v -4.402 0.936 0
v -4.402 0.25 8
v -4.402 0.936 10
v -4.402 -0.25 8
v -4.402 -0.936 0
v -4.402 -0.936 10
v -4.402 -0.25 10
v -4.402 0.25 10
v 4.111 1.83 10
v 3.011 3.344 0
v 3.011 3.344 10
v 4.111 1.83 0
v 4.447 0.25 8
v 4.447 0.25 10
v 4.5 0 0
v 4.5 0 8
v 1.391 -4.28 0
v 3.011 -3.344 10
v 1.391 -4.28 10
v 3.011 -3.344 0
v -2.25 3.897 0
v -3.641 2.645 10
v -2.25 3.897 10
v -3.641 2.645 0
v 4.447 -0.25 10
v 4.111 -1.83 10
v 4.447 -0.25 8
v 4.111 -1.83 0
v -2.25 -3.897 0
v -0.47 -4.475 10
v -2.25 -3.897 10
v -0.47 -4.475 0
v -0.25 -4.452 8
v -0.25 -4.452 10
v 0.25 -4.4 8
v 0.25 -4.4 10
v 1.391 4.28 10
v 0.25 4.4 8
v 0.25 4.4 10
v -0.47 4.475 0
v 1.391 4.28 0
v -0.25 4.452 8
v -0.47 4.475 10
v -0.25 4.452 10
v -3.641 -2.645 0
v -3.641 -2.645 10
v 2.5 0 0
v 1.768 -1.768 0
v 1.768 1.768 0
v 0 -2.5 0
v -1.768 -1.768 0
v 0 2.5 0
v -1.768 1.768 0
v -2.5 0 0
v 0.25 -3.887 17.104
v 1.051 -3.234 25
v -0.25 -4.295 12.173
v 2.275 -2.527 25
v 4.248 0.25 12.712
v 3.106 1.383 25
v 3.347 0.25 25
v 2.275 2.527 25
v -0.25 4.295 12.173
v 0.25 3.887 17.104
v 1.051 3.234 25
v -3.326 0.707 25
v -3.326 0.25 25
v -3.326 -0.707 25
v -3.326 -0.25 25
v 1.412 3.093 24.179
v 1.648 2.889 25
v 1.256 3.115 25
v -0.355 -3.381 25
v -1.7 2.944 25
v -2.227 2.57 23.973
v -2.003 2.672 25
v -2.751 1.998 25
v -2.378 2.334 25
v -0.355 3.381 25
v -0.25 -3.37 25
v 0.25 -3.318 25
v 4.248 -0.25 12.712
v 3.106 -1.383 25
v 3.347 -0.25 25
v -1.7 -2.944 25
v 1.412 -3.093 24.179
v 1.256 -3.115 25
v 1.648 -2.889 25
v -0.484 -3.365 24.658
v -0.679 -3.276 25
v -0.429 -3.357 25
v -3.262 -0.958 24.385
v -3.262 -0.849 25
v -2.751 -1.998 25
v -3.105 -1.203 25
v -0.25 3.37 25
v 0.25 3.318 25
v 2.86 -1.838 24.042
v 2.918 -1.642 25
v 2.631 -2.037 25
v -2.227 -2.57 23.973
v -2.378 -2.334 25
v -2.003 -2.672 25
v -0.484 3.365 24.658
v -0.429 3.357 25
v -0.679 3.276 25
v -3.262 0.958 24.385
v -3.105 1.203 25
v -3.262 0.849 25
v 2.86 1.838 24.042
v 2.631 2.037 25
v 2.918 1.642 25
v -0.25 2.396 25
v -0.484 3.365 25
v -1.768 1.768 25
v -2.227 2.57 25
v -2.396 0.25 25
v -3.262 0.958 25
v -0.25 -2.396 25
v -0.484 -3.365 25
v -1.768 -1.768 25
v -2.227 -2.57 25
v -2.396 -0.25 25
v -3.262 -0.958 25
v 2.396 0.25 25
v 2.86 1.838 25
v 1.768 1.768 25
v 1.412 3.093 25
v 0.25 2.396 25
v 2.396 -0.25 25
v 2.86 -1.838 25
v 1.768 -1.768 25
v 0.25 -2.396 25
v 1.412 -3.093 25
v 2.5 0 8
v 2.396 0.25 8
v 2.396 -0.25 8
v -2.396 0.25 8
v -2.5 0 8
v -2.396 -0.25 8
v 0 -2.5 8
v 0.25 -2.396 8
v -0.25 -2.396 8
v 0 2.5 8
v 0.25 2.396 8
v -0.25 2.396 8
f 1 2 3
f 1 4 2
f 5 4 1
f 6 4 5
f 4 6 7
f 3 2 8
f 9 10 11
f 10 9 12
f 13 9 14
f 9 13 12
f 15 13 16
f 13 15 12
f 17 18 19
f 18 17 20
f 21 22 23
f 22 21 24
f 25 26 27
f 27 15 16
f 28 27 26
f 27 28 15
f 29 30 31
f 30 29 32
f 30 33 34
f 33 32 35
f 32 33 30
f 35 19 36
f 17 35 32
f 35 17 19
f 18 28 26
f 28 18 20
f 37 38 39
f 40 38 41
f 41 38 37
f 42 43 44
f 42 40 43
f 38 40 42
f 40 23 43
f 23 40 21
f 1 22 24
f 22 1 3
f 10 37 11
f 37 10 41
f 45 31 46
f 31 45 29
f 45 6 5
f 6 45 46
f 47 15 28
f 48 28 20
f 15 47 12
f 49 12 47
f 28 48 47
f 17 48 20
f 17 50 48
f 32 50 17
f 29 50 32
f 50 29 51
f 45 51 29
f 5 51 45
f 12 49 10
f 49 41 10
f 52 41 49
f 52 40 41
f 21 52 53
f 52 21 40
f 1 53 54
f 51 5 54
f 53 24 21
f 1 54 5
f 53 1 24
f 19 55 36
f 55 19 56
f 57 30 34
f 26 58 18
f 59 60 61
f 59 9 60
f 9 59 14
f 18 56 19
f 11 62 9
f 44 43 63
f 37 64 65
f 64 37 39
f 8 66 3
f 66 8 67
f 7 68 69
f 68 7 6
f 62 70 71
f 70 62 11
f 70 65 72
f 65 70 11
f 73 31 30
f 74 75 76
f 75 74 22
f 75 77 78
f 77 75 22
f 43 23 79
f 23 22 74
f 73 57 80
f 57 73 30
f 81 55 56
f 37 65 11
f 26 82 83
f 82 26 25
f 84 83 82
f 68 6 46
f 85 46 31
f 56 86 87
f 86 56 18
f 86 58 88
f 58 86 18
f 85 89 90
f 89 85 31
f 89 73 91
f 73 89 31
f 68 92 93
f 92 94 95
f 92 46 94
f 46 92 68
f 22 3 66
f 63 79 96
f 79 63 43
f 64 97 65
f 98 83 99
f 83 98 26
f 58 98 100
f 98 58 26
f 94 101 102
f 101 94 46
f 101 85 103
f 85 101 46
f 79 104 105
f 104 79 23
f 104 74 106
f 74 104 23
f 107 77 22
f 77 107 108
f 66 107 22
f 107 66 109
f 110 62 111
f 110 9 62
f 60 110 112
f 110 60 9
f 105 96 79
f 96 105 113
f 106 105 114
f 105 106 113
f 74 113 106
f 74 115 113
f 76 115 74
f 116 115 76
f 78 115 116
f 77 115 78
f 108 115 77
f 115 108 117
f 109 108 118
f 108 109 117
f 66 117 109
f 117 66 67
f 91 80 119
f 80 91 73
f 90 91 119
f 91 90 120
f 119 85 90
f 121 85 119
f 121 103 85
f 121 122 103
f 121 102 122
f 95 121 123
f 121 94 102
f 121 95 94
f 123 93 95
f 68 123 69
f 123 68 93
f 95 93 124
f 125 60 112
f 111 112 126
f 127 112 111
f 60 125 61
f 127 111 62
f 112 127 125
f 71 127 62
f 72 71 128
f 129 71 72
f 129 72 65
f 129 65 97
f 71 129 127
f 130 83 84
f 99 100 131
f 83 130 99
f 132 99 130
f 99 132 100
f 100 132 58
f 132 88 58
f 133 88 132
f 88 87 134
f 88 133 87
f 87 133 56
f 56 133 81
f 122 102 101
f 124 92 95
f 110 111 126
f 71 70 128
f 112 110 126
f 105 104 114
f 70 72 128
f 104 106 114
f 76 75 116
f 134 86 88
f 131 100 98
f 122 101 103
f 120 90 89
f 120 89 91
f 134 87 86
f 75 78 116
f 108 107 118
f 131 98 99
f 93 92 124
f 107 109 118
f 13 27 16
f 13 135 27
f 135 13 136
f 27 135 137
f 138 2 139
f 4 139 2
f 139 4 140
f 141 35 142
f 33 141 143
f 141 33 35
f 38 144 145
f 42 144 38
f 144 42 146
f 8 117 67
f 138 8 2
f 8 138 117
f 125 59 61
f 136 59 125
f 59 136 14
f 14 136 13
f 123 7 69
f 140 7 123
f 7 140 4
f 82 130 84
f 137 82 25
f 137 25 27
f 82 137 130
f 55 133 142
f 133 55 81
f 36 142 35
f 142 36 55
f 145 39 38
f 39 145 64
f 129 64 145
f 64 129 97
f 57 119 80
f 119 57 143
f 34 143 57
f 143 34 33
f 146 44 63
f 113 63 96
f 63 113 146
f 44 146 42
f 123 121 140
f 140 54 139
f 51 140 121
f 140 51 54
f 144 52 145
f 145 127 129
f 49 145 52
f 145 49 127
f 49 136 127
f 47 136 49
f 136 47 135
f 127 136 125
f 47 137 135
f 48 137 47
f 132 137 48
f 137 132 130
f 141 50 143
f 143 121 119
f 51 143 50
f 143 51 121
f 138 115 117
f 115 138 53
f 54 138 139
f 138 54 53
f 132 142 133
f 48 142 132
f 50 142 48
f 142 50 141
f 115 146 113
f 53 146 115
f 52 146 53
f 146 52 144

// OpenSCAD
// Drill depth gauge collet
// default sizes are for a M8 nut
module collet(
	drilldia=5,
	min=6.8,
	max=9,
	slot=0.5) {


	difference() {
		union() {
			cylinder(r=max/2, h=10);
			translate([0,0,10])
				cylinder(r1=max/2, r2=min/2, h=15);
			translate([0,0,20])
				cylinder(r=min/2,h=5);
		}

		translate([-10,-slot/2,8])
			cube([20,slot,20]);

		translate([-slot/2,-10,8])
			cube([slot,20,20]);

		translate([0,0,-5])
			cylinder(r=drilldia/2, h=40);
	}
}


collet();
